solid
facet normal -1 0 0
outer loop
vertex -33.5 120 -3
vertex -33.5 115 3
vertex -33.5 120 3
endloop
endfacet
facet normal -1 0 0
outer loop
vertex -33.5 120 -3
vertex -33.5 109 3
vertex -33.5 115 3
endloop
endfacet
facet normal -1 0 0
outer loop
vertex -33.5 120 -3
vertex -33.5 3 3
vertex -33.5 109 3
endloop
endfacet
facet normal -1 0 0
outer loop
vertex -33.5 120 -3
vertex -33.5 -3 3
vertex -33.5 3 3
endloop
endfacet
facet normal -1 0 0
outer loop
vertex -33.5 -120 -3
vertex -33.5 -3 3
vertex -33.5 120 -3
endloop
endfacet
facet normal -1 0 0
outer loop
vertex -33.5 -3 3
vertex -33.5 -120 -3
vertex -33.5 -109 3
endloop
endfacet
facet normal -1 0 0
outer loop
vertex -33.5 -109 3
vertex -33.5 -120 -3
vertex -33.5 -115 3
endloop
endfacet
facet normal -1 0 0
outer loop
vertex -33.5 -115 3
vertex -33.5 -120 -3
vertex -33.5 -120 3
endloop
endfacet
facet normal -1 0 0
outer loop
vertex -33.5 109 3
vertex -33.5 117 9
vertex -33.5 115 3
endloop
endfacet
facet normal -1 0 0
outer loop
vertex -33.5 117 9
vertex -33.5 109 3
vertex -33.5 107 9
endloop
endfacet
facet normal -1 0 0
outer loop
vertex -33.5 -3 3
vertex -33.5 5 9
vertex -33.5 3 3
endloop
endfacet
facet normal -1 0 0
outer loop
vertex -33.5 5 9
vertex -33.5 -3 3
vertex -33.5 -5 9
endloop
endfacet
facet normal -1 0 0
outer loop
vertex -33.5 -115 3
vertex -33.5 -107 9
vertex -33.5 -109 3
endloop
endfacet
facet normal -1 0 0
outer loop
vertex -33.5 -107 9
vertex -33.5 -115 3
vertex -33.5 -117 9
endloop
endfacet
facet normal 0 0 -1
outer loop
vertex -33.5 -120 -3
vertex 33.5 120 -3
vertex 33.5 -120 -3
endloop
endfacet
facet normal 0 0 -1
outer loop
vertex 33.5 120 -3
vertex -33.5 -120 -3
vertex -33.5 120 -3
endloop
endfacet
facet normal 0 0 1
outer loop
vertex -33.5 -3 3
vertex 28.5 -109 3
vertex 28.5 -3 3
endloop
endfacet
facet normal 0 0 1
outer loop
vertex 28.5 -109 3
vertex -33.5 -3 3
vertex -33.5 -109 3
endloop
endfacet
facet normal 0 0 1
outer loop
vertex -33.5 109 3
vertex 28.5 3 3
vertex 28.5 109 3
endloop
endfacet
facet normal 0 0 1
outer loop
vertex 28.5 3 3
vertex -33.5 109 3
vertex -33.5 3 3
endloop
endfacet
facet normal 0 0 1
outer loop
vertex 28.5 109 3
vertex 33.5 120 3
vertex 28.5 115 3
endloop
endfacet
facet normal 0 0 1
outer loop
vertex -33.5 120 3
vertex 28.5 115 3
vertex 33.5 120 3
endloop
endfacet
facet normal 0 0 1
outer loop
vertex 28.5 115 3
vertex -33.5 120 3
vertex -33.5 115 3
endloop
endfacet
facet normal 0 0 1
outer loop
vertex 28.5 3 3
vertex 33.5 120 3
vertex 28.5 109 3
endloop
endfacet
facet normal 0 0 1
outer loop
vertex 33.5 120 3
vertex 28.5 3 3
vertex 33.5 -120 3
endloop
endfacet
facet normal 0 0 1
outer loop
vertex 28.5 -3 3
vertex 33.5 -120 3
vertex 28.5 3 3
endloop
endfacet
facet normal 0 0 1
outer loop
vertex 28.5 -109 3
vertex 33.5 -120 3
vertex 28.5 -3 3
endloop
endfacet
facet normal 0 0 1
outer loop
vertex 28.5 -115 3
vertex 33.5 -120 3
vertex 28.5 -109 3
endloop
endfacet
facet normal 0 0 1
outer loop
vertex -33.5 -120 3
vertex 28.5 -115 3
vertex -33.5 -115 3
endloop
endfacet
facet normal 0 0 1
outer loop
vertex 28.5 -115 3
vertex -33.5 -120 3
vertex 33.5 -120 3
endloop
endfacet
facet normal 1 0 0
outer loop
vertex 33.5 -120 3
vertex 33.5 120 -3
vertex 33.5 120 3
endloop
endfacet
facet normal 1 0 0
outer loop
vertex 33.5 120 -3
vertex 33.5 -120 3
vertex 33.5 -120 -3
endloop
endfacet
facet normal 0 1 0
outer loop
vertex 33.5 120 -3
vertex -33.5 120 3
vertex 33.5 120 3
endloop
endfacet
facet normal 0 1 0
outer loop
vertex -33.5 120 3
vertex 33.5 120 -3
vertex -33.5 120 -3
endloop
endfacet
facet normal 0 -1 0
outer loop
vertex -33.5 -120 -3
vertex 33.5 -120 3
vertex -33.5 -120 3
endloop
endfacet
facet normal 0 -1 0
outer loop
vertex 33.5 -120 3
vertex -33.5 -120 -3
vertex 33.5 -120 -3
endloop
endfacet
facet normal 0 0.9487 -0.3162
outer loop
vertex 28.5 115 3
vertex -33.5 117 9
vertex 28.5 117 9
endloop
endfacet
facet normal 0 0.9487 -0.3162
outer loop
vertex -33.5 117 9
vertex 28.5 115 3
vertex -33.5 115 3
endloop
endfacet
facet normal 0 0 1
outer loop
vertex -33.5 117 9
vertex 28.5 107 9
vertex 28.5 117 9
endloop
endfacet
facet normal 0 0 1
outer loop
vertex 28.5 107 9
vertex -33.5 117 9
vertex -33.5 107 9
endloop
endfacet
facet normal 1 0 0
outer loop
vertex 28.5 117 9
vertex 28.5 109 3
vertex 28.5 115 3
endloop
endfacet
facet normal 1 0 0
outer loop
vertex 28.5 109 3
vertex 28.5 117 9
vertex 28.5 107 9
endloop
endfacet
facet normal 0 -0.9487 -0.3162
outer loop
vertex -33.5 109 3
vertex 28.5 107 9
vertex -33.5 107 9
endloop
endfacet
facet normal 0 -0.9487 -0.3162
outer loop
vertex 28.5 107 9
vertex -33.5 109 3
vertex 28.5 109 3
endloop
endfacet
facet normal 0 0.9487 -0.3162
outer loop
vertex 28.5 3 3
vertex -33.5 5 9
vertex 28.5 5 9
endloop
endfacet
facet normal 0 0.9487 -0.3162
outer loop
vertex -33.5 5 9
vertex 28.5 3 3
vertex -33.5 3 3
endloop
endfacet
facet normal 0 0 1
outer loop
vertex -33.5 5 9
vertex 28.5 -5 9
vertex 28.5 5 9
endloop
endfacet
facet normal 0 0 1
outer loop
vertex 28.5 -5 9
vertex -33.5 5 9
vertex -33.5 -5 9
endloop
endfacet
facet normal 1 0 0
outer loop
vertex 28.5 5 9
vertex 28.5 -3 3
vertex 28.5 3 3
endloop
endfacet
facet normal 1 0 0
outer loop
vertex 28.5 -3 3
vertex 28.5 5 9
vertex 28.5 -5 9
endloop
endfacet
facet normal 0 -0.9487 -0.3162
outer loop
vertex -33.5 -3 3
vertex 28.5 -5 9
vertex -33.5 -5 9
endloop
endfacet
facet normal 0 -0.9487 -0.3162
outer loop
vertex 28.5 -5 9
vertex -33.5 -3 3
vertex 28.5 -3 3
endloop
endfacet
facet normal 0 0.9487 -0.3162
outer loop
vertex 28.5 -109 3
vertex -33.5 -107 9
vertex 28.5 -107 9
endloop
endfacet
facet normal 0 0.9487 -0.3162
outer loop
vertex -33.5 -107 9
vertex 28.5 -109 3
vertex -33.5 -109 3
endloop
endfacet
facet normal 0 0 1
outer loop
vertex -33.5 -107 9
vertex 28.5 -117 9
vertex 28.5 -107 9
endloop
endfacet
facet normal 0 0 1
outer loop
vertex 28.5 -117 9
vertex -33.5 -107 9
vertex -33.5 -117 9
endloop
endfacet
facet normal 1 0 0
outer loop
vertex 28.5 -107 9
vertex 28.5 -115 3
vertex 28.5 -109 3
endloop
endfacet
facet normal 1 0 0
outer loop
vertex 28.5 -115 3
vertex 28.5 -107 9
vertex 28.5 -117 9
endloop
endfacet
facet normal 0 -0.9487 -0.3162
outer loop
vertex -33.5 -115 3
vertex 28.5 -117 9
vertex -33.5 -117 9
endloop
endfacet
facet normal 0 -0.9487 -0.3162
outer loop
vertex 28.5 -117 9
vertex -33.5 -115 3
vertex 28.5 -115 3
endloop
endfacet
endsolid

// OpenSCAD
// file: shelf.scad
include <common.scad>
include <config.scad>

module shelf()
{
	c_l = shelf_d;
	c_w = shelf_w;
	c_h = shelf_t;

	joint_x = shelf_w / 2 - wall_t / 2;
	joint_y = - shelf_d / 2;
	joint_z = - shelf_t / 2;

	union()
	{
		color(color_shelf)
			cube([c_l, c_w, c_h], center=true);

		color(color_dovetail)
			rotate([0, 0, 90])
				translate([joint_x, joint_y, joint_z])
					dovetail(
						length = shelf_dovetail_len,
						depth = joint_depth,
						neck = joint_neck,
						head = joint_head
					);

		color(color_dovetail)
			rotate([0, 0, 90])
				translate([0, joint_y, joint_z])
					dovetail(
						length = shelf_dovetail_len,
						depth = joint_depth,
						neck = joint_neck,
						head = joint_head
					);

		color(color_dovetail)
			rotate([0, 0, 90])
				translate([-joint_x, joint_y, joint_z])
					dovetail(
						length = shelf_dovetail_len,
						depth = joint_depth,
						neck = joint_neck,
						head = joint_head
					);
	}
}
// file: config.scad
clearance = 0.25;
eps = 0.02;

color_dovetail = "red";
color_joint = "purple";
color_print = "white";
color_shelf = "green";
color_test = "black";
color_wall = "orange";

shelf_d = 67;
shelf_h_sep = 80;
shelf_t = 6;
shelf_w = 240;

wall_cut = 25;
wall_t = 16;

joint_depth = 6;
joint_neck = 6;
joint_head = 10;
back_stop = 5;

shelf_dovetail_len = shelf_d - back_stop;
wall_dovetail_len = wall_t - back_stop;
// file: common.scad
include <config.scad>

module dovetail(length,
	depth,
	neck,
	head)
{
	rotate([-90, 0, 0])
		linear_extrude(height = length, convexity = 10)
			polygon(points = [
				[-neck / 2, 0],
				[-head / 2, depth],
				[ head / 2, depth],
				[ neck / 2, 0]
			]);
}
// main file
include <common.scad>
include <config.scad>
include <shelf.scad>

rotate([0, 180, 0])
	color(color_print)
		shelf();
